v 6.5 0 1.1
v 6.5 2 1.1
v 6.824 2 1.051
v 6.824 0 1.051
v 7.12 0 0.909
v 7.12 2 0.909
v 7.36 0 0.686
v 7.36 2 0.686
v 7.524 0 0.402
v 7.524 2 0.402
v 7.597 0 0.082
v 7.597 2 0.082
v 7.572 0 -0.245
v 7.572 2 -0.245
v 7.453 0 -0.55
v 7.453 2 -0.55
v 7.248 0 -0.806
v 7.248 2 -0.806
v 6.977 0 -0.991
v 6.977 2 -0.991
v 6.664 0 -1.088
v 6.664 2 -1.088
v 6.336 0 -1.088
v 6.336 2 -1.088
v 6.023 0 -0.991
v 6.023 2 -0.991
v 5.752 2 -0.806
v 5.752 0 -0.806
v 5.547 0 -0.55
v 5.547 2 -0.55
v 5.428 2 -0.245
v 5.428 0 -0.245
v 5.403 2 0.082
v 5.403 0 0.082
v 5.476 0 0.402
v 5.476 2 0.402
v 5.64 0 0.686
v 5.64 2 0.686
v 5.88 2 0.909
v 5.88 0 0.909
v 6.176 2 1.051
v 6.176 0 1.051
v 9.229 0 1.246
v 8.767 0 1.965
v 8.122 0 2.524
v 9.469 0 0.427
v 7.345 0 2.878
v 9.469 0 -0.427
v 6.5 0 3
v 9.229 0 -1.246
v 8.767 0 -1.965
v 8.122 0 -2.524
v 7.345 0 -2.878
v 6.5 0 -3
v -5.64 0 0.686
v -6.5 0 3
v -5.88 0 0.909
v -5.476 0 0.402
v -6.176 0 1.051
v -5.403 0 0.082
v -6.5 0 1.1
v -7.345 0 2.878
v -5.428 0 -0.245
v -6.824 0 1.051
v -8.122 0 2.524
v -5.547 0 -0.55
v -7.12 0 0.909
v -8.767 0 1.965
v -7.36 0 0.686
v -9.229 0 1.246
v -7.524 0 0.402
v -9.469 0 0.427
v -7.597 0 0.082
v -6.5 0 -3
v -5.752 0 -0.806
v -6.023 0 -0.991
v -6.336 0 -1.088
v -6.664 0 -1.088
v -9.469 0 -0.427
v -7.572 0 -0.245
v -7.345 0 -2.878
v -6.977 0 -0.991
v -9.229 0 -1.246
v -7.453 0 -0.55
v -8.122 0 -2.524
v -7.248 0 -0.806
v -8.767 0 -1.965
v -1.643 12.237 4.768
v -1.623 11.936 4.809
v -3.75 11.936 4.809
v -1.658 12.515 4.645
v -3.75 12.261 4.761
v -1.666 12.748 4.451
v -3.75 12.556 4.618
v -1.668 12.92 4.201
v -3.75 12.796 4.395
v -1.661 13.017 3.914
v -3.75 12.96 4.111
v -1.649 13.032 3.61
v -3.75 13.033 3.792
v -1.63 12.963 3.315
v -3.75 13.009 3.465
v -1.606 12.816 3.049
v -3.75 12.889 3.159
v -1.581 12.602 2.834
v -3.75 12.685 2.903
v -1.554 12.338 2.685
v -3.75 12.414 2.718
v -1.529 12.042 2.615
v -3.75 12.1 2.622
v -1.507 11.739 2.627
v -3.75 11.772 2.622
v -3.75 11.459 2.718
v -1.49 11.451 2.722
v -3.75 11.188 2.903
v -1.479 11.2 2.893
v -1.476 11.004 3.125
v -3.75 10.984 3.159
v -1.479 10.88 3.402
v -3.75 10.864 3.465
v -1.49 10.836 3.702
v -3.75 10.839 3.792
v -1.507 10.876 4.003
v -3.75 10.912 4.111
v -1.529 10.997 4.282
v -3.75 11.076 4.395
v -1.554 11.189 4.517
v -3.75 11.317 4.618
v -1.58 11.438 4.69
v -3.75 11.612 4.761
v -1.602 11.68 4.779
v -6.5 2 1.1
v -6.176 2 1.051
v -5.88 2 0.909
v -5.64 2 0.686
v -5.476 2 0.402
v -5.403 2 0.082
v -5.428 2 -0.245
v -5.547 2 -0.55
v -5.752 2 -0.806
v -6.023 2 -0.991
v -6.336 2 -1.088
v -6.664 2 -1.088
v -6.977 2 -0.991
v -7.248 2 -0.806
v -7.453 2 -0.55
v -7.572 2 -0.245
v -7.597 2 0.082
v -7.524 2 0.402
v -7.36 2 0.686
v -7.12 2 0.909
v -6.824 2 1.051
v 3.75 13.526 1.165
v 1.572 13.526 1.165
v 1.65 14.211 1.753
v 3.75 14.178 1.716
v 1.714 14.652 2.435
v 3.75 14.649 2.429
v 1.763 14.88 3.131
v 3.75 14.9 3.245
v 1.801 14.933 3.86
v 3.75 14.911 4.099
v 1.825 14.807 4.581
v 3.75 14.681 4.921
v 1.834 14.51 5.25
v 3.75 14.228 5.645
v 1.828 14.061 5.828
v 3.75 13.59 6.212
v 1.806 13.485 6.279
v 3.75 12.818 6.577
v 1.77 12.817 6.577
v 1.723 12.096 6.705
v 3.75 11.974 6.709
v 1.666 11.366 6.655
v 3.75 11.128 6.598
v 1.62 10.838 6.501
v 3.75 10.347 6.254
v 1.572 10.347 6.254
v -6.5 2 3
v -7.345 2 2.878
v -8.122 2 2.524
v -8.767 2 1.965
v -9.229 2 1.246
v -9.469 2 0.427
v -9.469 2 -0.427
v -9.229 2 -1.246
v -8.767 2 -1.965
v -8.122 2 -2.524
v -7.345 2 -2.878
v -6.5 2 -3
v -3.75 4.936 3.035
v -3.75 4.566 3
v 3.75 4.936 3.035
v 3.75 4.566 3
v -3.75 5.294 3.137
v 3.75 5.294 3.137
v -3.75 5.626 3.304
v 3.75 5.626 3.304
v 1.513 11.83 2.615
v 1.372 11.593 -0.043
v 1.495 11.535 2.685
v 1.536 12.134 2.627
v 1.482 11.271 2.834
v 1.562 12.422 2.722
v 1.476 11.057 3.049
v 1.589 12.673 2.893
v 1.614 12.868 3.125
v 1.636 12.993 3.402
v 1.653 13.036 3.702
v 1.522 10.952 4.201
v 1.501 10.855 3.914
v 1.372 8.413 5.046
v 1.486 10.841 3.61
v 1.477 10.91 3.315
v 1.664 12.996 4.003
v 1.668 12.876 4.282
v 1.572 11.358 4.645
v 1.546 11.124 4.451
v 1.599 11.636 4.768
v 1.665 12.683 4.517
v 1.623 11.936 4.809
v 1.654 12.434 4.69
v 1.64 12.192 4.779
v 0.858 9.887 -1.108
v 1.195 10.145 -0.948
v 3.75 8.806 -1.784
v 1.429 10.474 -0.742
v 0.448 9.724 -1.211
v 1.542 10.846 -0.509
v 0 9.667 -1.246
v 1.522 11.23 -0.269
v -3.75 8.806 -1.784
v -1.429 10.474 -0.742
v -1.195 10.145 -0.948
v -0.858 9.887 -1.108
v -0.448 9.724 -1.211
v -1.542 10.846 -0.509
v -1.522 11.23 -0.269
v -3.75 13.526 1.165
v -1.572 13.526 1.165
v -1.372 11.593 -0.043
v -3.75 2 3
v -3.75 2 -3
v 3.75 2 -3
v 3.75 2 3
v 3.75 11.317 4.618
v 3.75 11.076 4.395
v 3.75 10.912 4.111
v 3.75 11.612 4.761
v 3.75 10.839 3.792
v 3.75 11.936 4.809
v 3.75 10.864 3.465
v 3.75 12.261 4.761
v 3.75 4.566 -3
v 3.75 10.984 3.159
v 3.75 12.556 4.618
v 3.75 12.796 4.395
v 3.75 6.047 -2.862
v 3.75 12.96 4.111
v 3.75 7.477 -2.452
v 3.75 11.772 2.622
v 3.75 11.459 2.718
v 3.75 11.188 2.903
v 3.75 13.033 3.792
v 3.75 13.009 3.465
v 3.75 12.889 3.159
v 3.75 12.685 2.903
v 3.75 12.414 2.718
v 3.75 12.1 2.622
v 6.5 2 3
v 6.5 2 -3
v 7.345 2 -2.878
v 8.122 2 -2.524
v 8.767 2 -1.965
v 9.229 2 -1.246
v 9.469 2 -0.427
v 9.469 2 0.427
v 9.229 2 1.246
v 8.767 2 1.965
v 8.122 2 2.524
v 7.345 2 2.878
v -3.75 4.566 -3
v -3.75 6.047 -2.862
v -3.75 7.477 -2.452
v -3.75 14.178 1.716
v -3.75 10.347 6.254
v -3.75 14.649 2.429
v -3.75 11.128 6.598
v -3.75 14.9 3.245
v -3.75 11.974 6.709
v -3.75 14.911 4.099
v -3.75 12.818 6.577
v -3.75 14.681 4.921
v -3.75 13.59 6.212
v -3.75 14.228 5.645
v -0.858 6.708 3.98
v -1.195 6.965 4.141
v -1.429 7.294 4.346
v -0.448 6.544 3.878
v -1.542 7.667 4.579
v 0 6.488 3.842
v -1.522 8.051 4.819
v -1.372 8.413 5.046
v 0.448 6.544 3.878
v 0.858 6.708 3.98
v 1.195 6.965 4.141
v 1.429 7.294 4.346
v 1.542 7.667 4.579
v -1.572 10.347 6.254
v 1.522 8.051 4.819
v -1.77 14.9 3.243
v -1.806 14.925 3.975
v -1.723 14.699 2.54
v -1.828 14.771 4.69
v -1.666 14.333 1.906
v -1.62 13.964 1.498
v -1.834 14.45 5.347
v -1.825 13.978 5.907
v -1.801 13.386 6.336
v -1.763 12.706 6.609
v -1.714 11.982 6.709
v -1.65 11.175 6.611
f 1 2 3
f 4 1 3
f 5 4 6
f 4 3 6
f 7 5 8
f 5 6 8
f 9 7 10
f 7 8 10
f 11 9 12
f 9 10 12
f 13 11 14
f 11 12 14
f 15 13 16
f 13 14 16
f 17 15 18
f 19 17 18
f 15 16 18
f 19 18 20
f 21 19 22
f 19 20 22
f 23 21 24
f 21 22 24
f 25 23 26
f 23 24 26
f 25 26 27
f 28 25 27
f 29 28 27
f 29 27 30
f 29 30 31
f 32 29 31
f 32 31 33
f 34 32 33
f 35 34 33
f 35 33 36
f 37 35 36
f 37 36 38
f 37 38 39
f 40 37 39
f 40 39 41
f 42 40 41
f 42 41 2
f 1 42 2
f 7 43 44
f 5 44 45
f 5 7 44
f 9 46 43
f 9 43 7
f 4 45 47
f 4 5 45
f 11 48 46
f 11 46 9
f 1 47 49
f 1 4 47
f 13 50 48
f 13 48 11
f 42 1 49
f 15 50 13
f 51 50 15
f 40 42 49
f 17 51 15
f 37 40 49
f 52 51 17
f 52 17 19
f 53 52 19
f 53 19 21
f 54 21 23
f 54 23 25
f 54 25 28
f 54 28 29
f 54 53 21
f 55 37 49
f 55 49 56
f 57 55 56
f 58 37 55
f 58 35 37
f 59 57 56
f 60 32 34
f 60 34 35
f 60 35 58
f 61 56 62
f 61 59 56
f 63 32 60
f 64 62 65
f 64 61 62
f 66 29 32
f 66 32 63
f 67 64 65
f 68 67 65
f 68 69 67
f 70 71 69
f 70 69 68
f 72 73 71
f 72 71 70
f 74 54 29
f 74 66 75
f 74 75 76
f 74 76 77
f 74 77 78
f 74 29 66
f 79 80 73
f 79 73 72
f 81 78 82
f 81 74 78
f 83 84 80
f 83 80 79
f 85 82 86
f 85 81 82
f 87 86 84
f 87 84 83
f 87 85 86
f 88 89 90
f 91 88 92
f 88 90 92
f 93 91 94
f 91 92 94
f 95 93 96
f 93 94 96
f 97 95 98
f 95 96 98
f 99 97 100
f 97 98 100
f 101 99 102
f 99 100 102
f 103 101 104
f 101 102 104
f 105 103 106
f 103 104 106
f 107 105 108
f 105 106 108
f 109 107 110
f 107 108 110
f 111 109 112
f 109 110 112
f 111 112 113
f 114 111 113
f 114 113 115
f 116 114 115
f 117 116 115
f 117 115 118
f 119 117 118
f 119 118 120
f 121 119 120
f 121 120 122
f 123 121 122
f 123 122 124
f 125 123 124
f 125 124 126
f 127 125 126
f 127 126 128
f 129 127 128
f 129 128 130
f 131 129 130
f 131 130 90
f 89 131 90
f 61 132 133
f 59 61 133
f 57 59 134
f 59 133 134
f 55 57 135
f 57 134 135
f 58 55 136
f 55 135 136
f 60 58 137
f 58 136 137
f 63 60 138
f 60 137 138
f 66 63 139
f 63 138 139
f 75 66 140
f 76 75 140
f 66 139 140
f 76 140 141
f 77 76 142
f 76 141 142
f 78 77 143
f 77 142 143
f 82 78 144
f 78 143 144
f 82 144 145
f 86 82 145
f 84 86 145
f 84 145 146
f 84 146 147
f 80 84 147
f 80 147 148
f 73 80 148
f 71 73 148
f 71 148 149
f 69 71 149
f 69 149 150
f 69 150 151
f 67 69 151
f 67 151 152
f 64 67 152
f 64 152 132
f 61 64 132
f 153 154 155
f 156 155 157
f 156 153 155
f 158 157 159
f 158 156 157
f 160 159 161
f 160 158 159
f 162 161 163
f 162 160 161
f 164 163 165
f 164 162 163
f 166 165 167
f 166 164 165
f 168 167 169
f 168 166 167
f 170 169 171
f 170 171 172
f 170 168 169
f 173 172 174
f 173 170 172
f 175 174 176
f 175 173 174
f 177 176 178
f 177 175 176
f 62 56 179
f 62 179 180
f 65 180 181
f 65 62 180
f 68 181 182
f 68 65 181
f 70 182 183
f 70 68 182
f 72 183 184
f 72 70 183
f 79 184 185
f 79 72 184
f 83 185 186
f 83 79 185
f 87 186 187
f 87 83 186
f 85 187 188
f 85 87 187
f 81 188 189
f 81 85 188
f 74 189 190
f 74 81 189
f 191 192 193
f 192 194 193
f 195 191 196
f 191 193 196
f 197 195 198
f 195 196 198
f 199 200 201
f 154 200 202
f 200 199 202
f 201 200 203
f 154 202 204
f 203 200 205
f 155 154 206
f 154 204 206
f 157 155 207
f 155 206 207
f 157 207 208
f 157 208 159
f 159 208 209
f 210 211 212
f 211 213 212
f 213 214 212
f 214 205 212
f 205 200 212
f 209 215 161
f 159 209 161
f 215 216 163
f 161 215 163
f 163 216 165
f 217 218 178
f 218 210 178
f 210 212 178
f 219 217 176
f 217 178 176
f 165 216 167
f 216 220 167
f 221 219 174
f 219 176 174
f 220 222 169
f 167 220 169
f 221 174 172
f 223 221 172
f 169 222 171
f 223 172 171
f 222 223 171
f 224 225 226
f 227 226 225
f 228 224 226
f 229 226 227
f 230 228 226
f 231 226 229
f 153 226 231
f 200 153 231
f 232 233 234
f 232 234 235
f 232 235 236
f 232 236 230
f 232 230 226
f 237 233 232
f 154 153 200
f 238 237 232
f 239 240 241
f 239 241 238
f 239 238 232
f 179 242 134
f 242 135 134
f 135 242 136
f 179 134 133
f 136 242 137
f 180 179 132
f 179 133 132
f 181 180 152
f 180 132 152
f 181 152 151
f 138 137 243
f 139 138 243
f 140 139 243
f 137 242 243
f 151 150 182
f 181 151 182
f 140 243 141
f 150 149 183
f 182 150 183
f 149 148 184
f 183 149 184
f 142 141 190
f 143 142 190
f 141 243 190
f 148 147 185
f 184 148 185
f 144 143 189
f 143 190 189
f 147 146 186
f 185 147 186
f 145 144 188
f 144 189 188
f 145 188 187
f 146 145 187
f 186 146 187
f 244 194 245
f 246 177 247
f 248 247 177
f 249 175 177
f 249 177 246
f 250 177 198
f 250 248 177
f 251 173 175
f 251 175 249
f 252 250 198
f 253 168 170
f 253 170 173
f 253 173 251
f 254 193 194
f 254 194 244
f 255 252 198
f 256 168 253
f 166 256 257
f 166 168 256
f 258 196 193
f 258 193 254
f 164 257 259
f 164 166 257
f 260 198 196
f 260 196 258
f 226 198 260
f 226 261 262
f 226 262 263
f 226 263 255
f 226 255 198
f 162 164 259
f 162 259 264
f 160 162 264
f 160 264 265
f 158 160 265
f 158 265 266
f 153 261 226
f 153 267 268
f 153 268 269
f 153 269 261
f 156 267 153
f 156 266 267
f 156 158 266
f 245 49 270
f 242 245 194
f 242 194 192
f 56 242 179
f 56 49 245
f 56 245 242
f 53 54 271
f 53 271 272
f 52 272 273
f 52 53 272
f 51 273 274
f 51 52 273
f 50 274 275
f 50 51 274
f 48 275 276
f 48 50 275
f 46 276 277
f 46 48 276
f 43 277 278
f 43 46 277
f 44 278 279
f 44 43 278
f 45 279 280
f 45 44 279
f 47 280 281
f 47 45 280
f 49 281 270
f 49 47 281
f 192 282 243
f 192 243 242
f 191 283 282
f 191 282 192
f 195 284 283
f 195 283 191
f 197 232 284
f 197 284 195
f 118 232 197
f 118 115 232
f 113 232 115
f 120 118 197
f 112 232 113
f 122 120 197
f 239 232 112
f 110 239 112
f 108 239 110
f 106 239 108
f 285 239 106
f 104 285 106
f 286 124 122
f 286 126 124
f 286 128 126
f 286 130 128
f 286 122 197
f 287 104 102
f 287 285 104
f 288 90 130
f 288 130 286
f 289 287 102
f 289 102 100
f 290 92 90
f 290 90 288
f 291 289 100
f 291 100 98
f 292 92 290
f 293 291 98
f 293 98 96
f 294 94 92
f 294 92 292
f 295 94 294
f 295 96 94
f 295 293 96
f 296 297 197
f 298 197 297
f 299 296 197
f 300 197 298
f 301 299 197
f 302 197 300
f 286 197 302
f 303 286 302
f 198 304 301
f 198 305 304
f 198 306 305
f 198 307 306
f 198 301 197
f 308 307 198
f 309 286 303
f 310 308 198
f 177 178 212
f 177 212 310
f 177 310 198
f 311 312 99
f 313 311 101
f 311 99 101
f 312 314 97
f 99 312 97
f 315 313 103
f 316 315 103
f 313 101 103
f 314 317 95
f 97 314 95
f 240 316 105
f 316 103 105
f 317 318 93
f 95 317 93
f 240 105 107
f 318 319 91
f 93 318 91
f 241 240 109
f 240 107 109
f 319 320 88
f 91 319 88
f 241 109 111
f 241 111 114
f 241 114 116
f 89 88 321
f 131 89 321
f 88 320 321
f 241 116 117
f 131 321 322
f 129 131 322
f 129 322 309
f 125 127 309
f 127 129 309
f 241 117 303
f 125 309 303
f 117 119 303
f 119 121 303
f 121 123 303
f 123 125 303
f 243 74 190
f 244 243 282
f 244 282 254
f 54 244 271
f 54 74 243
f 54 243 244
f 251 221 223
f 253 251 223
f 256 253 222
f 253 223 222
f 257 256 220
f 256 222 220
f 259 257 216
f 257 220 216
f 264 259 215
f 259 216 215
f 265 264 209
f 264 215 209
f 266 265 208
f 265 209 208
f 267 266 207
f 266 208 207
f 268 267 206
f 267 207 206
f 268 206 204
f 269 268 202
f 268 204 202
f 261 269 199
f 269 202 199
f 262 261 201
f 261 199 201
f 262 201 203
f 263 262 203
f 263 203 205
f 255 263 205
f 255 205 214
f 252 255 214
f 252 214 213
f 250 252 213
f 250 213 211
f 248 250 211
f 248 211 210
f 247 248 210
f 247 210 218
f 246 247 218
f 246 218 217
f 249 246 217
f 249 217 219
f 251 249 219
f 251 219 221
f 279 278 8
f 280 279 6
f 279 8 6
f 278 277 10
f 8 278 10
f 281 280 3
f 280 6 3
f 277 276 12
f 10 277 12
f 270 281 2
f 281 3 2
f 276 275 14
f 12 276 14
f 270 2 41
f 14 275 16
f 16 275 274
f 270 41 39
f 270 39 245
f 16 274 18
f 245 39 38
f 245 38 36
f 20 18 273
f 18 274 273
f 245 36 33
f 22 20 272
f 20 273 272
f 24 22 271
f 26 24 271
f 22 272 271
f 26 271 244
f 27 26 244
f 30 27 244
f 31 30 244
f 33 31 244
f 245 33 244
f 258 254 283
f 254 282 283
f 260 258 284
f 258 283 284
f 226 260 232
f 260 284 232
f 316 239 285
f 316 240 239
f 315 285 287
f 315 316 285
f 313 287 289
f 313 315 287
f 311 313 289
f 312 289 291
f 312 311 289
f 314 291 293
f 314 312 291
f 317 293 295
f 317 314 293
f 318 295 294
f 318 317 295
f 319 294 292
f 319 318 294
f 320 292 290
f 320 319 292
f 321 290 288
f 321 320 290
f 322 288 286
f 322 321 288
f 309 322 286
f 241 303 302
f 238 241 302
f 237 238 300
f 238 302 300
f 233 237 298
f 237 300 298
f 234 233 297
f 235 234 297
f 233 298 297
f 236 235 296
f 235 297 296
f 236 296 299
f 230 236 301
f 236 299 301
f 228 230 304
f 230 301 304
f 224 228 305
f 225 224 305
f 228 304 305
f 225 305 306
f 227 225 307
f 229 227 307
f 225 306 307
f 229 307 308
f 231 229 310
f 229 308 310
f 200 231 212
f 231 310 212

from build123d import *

# Parameters (mm, degrees)
EXTRUDE_1_DEPTH     = 2
SKETCH_7_R          = 1.1
CUT_EXTRUDE_5_DEPTH = 3.5
SKETCH_8_W          = 7.5
SKETCH_8_H          = 6
FILLET_1_RADIUS     = 3
FILLET_1_LENGTH     = 7.5
CUT_EXTRUDE_6_DEPTH = 10
SKETCH_12_R         = 1.1
CUT_EXTRUDE_7_DEPTH = 10


with BuildPart() as part:
    # 草图1 → 凸台-拉伸1 (new body)
    with BuildSketch(Plane(origin=(0, 0, 0), x_dir=(1, 0, 0), z_dir=(0, 1, 0))):
        with BuildLine():
            Line((-6.5, 3), (6.5, 3))
            ThreePointArc((6.5, 3), (9.5, 0), (6.5, -3))
            Line((6.5, -3), (-6.5, -3))
            ThreePointArc((-6.5, -3), (-9.5, 0), (-6.5, 3))
        make_face()
    extrude(amount=EXTRUDE_1_DEPTH)

    # 草图7 → 切除-拉伸5 (cut)
    with BuildSketch(Plane(origin=(0, 2, 0), x_dir=(1, 0, 0), z_dir=(0, 1, 0))):
        with Locations(Location((6.5, 0, 0), (0, 0, 270))):
            Circle(SKETCH_7_R)
        with Locations(Location((-6.5, 0, 0), (0, 0, 270))):
            Circle(SKETCH_7_R)
    extrude(amount=-CUT_EXTRUDE_5_DEPTH, mode=Mode.SUBTRACT)

    # 扫描1: sweep along a path in 草图9
    with BuildLine(Plane(origin=(0, 0, 0), x_dir=(0, 0, -1), z_dir=(1, 0, 0))) as sweep_1_path:
        Line((0, 2), (0, 4.566273071))
        ThreePointArc((0, 4.566273071), (-0.19369152, 5.94445985), (-0.759759519, 7.215869392))
        Line((-0.759759519, 7.215869392), (-5.299192642, 14.480480962))
    # 草图8 → 扫描1 (sweep)
    with BuildSketch(Plane(origin=(0, 2, 0), x_dir=(1, 0, 0), z_dir=(0, 1, 0))):
        Rectangle(SKETCH_8_W, SKETCH_8_H)
    sweep(path=sweep_1_path.line)

    # 圆角1: full round fillet: the end face becomes a half cylinder, R = half its width
    fillet_1_face = Plane((0, 14.480480962, 5.299192642), x_dir=(1, 0, 0), z_dir=(0, 0.848048096156, 0.529919264233))  # on the end face: x along it, z out of the body
    fillet_1_slab = fillet_1_face.offset(-FILLET_1_RADIUS / 2) * Box(FILLET_1_LENGTH, 2 * FILLET_1_RADIUS, FILLET_1_RADIUS, mode=Mode.PRIVATE)  # the body's end, R deep
    fillet_1_round = Plane((0, 11.936336674, 3.709434849), x_dir=(0, 0.848048096156, 0.529919264233), z_dir=(1, 0, 0)) * Cylinder(FILLET_1_RADIUS, FILLET_1_LENGTH, mode=Mode.PRIVATE)  # its axis R under the face
    add(fillet_1_slab - fillet_1_round, mode=Mode.SUBTRACT)

    # 草图10 → 切除-拉伸6 (cut)
    with BuildSketch(Plane(origin=(0, 0.095128767, -0.15223785), x_dir=(1, 0, 0), z_dir=(0, -0.5299192642332061, 0.8480480961564253))):
        with BuildLine():
            Line((1.372390297, 9.808736266), (2.069809275, 17.780271657))
            Line((2.069809275, 17.780271657), (-2.069809275, 17.780271657))
            Line((-2.069809275, 17.780271657), (-1.372390297, 9.808736266))
            ThreePointArc((-1.372390297, 9.808736266), (0, 7.538288577), (1.372390297, 9.808736266))
        make_face()
    extrude(amount=-CUT_EXTRUDE_6_DEPTH, mode=Mode.SUBTRACT)

    # 草图12 → 切除-拉伸7 (cut)
    with BuildSketch(Plane.ZY.offset(3.75)):
        with Locations((3.70943485, 11.936336673)):
            Circle(SKETCH_12_R)
    extrude(amount=-CUT_EXTRUDE_7_DEPTH, mode=Mode.SUBTRACT)


solid = part.part
